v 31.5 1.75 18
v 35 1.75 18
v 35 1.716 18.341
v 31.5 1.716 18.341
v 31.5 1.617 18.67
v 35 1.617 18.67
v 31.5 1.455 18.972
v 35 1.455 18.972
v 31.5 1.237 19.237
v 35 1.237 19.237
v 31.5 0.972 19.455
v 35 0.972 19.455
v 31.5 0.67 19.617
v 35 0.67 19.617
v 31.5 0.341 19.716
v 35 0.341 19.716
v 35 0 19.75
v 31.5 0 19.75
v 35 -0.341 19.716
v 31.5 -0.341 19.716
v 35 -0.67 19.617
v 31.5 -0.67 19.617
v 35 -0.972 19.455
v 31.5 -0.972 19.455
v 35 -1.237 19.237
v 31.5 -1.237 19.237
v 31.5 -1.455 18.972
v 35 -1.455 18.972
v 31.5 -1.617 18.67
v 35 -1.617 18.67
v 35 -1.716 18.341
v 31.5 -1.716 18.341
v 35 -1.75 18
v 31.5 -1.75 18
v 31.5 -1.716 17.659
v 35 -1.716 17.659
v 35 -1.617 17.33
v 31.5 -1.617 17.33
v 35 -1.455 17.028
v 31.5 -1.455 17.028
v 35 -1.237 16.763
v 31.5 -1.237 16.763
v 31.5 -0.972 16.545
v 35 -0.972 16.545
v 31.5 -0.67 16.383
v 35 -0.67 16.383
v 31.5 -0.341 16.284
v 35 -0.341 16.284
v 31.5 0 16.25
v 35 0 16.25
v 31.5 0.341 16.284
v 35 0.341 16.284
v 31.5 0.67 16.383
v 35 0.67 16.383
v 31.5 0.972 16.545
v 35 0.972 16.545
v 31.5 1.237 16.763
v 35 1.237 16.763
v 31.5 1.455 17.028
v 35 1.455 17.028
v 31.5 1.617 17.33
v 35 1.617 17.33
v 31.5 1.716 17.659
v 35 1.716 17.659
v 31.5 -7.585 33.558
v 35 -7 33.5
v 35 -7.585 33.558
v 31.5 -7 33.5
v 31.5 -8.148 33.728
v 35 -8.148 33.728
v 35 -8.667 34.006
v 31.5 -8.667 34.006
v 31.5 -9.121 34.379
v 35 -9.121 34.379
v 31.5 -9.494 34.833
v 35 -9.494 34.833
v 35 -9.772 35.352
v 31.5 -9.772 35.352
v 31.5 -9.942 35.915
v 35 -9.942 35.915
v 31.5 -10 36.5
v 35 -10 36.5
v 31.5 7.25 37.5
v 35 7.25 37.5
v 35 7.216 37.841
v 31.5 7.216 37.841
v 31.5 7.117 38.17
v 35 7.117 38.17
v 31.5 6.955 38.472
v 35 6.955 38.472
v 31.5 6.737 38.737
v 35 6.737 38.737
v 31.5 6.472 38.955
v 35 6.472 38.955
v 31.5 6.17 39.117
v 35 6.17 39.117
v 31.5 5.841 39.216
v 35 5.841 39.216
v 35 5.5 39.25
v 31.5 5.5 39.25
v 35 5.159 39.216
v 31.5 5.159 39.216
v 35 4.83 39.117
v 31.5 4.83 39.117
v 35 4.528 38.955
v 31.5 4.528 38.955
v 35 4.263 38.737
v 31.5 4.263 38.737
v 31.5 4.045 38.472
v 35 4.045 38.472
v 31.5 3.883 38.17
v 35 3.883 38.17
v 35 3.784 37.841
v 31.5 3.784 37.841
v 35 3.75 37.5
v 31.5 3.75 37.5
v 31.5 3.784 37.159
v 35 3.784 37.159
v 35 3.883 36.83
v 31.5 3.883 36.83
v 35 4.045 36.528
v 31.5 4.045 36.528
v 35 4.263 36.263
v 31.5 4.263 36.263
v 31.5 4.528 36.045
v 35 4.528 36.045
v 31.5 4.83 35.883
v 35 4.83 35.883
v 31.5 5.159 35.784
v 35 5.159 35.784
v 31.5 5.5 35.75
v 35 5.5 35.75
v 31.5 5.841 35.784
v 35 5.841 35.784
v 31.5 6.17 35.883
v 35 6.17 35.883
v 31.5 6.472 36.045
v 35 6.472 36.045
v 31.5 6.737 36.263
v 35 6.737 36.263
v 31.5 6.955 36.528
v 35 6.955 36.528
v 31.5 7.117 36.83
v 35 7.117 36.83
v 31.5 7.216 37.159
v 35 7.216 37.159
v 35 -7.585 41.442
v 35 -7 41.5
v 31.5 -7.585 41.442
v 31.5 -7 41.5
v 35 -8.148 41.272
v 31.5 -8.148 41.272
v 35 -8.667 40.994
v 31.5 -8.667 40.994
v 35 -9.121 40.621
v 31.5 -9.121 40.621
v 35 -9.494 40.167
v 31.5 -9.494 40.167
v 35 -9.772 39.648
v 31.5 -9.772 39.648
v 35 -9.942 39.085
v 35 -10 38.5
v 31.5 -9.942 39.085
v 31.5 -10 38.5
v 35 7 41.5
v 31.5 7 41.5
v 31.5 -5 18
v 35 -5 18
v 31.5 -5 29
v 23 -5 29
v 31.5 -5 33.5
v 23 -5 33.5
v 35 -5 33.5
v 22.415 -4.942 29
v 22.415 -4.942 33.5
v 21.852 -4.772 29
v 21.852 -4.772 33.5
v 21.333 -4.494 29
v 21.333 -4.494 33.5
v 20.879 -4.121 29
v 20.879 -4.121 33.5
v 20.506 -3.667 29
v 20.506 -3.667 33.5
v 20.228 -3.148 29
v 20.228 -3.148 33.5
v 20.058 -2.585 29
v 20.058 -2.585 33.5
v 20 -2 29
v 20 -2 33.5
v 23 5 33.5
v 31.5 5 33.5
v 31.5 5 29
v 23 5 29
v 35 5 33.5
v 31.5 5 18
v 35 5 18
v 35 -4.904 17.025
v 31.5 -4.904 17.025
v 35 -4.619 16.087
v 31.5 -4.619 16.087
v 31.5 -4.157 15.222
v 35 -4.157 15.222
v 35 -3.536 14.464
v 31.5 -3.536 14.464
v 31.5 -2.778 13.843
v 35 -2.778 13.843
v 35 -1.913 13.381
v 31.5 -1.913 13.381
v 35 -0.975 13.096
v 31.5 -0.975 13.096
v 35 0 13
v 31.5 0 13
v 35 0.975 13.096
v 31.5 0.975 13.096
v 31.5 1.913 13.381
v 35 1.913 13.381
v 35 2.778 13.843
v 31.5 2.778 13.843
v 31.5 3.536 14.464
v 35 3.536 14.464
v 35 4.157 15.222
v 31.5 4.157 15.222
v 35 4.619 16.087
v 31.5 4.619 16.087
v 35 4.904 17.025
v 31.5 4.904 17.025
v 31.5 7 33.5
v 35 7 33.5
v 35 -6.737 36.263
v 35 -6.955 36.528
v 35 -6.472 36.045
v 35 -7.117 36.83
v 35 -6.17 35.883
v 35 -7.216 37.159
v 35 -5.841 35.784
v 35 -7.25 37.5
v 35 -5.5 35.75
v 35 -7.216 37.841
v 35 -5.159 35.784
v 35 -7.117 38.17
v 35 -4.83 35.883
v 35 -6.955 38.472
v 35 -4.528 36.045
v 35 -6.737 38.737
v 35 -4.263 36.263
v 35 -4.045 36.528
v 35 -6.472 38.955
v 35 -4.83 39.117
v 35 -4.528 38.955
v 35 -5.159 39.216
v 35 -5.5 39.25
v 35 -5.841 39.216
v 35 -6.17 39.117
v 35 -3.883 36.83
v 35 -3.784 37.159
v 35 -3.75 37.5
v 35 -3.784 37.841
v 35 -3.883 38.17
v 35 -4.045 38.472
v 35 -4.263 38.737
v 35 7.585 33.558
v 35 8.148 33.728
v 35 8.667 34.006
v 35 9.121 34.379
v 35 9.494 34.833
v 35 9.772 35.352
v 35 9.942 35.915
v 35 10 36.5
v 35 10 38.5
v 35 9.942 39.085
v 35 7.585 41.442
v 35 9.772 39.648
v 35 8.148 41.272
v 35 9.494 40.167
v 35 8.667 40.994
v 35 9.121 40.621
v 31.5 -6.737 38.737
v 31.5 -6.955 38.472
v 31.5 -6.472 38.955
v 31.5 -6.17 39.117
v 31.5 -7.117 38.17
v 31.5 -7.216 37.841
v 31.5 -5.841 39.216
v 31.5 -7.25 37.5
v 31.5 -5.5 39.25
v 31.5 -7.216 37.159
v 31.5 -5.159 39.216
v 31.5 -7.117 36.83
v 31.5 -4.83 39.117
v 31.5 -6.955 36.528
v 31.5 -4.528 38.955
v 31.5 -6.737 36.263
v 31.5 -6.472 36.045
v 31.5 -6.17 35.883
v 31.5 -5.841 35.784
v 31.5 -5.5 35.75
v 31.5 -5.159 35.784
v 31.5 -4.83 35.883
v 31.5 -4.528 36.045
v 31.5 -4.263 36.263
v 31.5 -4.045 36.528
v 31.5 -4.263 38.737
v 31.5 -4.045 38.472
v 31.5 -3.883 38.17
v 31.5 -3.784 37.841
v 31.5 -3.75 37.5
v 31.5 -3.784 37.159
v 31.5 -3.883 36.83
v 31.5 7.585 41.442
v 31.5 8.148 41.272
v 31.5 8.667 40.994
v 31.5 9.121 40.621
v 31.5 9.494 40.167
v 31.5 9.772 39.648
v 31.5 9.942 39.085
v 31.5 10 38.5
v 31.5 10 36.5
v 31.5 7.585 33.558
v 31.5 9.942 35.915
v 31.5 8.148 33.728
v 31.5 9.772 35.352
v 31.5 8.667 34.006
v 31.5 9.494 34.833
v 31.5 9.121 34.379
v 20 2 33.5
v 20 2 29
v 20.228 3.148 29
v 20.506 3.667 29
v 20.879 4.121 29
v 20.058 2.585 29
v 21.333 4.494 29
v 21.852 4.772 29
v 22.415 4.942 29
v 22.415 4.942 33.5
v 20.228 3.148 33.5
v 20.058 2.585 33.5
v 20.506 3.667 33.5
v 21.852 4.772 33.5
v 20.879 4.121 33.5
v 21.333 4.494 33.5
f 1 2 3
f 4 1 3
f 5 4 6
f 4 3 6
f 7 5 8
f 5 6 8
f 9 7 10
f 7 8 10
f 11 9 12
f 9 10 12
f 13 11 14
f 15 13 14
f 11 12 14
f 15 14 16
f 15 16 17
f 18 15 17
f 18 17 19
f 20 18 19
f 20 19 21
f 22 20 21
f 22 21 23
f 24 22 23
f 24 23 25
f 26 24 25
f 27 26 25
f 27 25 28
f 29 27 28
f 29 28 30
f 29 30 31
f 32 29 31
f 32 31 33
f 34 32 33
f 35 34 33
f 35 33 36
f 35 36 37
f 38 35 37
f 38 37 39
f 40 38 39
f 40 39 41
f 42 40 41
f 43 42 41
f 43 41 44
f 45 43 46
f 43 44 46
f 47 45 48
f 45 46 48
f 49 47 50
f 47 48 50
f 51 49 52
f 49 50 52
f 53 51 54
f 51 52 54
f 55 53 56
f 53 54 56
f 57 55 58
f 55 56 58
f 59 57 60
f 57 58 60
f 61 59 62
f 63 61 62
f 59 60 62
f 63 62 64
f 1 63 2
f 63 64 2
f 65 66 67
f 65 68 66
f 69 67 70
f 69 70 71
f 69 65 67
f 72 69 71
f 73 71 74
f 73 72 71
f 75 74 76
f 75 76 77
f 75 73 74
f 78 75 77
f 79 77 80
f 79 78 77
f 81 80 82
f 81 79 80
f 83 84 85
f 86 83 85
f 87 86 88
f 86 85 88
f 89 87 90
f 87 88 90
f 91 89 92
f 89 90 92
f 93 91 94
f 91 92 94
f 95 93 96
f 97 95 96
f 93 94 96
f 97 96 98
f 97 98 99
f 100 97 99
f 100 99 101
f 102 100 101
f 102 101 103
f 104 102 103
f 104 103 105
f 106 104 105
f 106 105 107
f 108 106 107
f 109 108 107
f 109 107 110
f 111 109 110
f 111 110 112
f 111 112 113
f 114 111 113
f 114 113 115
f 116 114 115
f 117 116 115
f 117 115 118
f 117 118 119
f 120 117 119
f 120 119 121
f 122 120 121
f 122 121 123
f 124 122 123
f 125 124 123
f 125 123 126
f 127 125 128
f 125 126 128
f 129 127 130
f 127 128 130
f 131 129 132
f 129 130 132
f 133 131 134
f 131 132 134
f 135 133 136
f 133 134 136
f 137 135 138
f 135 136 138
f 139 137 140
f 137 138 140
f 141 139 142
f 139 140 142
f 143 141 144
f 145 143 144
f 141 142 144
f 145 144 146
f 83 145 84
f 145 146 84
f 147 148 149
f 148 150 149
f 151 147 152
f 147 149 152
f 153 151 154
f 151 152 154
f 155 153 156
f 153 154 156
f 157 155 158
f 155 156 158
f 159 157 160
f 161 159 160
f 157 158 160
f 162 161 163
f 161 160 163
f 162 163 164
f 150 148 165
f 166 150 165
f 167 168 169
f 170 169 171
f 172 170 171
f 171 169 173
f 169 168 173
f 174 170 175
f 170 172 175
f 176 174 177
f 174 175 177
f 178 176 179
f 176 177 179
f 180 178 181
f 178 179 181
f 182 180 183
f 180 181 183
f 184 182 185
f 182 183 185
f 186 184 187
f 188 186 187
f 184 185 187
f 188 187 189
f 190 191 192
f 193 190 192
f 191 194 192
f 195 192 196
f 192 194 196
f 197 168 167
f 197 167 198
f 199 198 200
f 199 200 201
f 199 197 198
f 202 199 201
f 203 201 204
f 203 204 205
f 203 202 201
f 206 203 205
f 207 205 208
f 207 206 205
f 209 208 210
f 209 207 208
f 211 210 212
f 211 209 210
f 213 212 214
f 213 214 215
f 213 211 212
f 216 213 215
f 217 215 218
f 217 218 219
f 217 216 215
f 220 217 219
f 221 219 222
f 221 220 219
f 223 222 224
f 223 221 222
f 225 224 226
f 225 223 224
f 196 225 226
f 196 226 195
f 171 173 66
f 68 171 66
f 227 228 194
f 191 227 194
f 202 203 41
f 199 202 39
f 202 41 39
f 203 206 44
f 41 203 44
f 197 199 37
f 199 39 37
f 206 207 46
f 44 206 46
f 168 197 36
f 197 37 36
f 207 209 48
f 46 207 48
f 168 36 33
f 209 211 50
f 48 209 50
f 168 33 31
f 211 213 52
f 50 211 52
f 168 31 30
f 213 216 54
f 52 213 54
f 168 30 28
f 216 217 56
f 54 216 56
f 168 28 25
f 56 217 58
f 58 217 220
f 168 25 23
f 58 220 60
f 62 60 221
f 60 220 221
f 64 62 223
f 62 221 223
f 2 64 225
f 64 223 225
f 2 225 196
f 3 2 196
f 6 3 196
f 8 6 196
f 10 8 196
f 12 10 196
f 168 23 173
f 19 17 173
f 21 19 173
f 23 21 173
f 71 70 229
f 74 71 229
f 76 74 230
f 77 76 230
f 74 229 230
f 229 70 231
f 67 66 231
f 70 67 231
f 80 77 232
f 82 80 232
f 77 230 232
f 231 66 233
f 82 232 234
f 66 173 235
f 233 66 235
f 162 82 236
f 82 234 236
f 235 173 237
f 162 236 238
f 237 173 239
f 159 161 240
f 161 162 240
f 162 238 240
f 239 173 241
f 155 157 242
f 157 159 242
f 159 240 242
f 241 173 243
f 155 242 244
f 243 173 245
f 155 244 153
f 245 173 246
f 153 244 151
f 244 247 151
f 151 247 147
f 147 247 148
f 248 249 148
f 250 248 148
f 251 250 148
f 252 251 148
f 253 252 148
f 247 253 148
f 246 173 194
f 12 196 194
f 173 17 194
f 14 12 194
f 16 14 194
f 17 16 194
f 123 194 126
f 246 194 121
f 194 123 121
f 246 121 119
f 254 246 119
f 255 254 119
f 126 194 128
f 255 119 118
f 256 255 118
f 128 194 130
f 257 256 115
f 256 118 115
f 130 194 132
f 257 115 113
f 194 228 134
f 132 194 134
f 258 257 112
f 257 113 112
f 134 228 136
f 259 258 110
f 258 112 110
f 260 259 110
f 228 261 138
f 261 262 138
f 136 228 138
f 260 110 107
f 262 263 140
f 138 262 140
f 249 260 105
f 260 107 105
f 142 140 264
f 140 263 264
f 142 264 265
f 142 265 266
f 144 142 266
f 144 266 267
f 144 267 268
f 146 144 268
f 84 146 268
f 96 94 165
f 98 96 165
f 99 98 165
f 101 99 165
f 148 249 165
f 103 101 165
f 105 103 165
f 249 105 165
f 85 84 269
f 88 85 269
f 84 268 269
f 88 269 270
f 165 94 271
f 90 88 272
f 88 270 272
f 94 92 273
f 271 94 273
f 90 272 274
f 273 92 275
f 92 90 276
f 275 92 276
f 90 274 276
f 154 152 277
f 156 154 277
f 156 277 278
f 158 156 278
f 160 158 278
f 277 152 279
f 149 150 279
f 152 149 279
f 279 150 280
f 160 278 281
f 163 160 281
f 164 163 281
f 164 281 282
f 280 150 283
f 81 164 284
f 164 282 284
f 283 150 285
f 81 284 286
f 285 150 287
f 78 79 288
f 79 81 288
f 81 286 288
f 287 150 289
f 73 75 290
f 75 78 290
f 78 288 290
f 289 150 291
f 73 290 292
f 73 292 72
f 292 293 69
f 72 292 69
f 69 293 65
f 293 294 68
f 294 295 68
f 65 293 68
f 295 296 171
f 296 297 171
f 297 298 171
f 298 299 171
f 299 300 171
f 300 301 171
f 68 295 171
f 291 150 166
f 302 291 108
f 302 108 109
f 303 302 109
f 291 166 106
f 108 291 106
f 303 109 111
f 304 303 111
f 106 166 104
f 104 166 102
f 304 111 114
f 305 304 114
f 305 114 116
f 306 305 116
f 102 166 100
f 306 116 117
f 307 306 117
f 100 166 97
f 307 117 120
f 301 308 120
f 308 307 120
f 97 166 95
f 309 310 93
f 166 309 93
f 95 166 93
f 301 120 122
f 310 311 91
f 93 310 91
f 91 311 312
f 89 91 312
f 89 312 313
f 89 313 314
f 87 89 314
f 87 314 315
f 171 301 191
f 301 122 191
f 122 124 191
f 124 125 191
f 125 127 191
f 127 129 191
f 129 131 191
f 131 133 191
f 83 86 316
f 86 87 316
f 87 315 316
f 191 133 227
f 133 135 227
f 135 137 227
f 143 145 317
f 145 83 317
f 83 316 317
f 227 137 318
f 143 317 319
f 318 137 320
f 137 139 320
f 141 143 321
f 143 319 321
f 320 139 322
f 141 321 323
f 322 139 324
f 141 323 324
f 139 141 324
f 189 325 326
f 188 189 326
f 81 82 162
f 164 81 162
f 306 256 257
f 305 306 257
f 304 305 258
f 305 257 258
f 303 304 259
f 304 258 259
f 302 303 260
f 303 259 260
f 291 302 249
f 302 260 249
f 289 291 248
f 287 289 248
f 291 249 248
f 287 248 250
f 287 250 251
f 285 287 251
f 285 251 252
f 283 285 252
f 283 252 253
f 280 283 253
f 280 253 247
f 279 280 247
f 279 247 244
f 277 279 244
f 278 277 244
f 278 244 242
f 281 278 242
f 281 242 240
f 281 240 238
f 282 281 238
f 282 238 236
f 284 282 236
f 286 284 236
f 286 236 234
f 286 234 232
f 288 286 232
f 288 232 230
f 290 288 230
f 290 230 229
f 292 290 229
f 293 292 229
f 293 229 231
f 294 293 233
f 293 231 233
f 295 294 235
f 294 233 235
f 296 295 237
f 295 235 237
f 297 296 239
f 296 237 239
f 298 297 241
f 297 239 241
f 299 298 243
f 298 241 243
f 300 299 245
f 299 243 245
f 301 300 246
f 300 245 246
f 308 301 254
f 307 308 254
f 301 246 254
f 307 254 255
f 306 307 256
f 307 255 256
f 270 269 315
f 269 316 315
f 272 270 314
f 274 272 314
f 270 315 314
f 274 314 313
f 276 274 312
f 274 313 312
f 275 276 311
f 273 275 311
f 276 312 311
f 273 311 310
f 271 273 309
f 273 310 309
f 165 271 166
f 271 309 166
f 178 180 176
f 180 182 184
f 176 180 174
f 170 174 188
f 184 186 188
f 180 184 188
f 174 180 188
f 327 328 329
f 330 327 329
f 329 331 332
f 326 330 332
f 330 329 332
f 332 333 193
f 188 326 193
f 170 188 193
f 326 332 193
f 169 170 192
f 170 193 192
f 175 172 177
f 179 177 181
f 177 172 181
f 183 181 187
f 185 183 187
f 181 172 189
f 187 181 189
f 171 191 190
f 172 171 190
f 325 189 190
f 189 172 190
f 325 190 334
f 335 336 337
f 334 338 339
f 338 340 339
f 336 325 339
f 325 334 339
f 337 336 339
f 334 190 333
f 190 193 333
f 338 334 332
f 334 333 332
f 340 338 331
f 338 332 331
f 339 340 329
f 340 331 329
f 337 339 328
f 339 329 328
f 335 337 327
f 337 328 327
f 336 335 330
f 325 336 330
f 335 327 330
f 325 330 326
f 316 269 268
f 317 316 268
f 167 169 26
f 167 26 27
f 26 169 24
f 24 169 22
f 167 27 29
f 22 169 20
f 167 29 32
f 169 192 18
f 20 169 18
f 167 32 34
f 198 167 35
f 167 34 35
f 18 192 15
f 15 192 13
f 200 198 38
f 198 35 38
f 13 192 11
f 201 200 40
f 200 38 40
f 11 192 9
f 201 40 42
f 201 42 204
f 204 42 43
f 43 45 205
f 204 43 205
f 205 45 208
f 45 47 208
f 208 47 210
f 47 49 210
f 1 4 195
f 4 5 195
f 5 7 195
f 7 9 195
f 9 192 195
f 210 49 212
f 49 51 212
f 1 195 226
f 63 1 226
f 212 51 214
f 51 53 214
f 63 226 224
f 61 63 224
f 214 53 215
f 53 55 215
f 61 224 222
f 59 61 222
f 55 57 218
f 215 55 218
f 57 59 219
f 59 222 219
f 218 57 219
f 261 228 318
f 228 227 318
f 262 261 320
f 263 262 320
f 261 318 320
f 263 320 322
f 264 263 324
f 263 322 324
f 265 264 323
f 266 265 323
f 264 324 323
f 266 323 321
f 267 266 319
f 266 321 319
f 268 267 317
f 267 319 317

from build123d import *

# Parameters (mm, degrees)
SKETCH023_R              = 1.75
PAD024_DEPTH             = 40
PAD025_DEPTH             = 70
FILLET011_R              = 3
CLONE136_PLACEMENT_ANGLE = 180


with BuildPart() as pad024:
    # Sketch023 → Pad024 (new body)
    with BuildSketch(Plane(origin=(-50, 0, 0), x_dir=(0, -1, 0), z_dir=(-1, 0, 0))):
        with BuildLine():
            ThreePointArc((-5, 18), (1e-05, 13), (5, 18.000021))
            Line((5, 33.500021), (5, 18.000021))
            Line((10, 33.500021), (5, 33.500021))
            Line((10, 41.5), (10, 33.500021))
            Line((-10, 41.5), (10, 41.5))
            Line((-10, 33.5), (-10, 41.5))
            Line((-5, 33.5), (-10, 33.5))
            Line((-5, 18), (-5, 33.5))
        make_face()
        with Locations((-5.5, 37.5)):
            Circle(SKETCH023_R, mode=Mode.SUBTRACT)
        with Locations((5.5, 37.5)):
            Circle(SKETCH023_R, mode=Mode.SUBTRACT)
        with Locations((0, 18)):
            Circle(SKETCH023_R, mode=Mode.SUBTRACT)
    extrude(amount=-PAD024_DEPTH)


with BuildPart() as clone_of_support003:
    # Sketch022 → Pad025 (new body)
    with BuildSketch(Plane.XZ.offset(40)):
        Polygon((-31.5, 12), (-35, 12), (-35, 53.5), (-31.5, 53.5), (-31.5, 33.5), (-20, 33.5), (-20, 29), (-31.5, 29), align=None)
    extrude(amount=-PAD025_DEPTH)

    # Common001: intersect Pad024
    add(pad024.part, mode=Mode.INTERSECT)

    # Fillet011
    fillet011_edges = [clone_of_support003.edges().sort_by_distance(p)[0] for p in [
        (-20, -5, 31.25),
        (-20, 5, 31.25),
        (-33.25, -10, 33.500021),
        (-33.25, 10, 33.5),
        (-33.25, -10, 41.5),
        (-33.25, 10, 41.5),
    ]]
    fillet(fillet011_edges, radius=FILLET011_R)


with BuildPart() as clone_of_support003_1:
    # Clone136 placement: moved
    add(clone_of_support003.part.rotate(Axis((0, 0, 0), (0, 0, 1)), CLONE136_PLACEMENT_ANGLE))


solid = clone_of_support003_1.part
